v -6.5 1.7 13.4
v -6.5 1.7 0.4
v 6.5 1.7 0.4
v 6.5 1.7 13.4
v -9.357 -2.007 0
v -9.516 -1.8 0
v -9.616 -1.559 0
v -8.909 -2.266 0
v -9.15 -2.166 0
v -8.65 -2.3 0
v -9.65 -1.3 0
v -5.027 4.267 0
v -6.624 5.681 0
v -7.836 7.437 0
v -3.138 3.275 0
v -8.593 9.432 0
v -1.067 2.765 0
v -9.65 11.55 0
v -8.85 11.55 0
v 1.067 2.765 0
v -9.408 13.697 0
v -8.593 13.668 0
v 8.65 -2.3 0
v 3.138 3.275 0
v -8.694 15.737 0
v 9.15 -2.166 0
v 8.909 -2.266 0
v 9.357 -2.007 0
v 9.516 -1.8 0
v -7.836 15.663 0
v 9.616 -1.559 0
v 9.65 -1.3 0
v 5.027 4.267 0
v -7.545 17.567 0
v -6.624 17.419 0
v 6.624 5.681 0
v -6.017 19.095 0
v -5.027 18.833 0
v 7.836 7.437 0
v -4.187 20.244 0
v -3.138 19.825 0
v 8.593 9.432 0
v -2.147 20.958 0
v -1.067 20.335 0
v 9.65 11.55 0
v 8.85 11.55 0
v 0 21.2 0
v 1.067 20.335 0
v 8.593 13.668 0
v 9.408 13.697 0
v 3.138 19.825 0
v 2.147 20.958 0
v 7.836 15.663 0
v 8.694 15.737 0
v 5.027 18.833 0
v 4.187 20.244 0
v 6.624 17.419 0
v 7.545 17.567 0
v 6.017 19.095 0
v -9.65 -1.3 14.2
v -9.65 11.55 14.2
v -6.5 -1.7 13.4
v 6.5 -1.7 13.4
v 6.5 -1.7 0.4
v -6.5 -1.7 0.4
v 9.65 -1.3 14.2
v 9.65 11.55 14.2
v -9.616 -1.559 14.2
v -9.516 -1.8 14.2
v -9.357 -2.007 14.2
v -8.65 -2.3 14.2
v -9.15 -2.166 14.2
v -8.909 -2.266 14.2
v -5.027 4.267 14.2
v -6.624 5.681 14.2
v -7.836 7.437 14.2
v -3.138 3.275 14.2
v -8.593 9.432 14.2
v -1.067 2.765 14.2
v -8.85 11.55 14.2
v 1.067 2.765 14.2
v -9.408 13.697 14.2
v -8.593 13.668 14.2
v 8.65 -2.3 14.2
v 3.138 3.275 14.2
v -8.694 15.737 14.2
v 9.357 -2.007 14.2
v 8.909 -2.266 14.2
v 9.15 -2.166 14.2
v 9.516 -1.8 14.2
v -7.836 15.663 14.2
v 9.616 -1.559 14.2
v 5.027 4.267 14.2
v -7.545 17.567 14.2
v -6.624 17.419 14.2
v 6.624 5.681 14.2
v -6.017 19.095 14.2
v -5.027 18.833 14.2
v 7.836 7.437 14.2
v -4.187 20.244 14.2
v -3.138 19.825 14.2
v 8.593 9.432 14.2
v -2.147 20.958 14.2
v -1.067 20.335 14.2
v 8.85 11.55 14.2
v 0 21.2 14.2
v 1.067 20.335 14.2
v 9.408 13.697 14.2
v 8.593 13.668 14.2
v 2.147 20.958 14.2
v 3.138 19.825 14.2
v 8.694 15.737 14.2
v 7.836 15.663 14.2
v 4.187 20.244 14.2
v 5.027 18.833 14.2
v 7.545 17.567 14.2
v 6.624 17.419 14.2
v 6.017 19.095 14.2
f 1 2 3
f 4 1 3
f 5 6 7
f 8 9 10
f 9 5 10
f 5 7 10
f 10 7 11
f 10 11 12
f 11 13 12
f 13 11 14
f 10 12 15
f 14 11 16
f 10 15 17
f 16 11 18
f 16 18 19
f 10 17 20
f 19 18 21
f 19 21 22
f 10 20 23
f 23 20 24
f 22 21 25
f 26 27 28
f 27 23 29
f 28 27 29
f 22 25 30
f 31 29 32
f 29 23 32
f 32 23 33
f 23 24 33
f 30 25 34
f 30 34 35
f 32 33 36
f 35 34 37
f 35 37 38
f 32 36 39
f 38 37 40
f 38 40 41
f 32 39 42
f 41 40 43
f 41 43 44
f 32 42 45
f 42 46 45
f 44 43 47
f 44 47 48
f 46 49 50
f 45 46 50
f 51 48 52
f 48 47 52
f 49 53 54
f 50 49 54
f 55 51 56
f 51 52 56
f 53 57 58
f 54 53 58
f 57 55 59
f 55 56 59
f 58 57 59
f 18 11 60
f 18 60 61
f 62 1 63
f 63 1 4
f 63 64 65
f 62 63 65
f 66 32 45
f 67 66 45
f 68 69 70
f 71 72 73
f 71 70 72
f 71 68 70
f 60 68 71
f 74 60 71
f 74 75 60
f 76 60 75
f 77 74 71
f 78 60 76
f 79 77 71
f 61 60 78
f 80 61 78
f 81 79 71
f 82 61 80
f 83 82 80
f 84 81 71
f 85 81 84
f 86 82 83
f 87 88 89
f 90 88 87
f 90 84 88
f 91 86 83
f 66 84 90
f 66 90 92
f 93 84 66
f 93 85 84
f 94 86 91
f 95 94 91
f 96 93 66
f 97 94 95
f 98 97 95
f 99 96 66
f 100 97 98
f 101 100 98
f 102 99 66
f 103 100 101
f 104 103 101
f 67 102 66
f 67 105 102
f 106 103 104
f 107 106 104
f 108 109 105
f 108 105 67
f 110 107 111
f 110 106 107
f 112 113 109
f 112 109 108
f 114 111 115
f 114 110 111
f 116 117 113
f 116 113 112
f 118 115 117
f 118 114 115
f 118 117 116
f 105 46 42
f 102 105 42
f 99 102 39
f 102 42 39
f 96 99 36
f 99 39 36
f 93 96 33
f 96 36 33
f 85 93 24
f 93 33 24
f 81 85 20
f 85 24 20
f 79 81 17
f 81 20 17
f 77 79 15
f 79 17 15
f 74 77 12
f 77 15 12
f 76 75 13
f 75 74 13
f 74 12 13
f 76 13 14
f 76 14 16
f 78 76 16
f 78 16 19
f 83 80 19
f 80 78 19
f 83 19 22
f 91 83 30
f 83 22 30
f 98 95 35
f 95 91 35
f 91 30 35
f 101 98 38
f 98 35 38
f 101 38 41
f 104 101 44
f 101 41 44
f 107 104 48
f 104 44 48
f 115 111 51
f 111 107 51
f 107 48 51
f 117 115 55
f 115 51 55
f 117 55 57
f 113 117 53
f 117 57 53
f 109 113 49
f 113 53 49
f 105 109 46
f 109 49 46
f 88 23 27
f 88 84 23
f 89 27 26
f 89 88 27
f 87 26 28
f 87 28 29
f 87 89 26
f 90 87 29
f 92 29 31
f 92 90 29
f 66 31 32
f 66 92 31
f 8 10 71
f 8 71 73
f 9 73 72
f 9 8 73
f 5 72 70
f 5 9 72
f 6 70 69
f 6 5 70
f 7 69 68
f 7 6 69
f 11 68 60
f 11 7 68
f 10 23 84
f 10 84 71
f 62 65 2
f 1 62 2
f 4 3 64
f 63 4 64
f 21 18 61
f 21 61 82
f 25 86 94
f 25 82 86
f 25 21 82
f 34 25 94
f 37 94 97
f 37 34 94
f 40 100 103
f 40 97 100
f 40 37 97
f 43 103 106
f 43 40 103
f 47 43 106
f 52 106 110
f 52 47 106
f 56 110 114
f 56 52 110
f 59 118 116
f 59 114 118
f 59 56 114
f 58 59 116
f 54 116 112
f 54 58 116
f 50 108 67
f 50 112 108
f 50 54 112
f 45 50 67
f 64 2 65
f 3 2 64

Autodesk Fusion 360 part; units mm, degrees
sketch "Sketch1" plane through (0, 0, 0) normal (0, 0, 1) x (1, 0, 0)
  line L0 (6.5, -1.7) -> (-6.5, -1.7)
  line L1 (-6.5, -1.7) -> (-6.5, 1.7)
  line L2 (-6.5, 1.7) -> (6.5, 1.7)
  line L3 (6.5, 1.7) -> (6.5, -1.7)
  line L4 (6.5, -1.7) -> (-6.5, 1.7) construction
  line L5 (-6.5, -1.7) -> (6.5, 1.7) construction
  line L6 (6.5, -2.3) -> (-6.5, -2.3)
  line L7 (6.5, -2.3) -> (9.65, -2.3)
  circle A0 centre (0, 11.55) radius 8.85
  line L8 (9.65, -2.3) -> (9.65, 11.55)
  line L9 (0, 2.5) -> (0, 20)
  line L10 (-6.5, -2.3) -> (-9.65, -2.3)
  line L11 (-9.65, -2.3) -> (-9.65, 11.55)
  arc A1 (9.65, 11.55) -> (-9.65, 11.55) centre (0, 11.55) ccw
  dimension "d1" = 13
  dimension "d2" = 3.4
  dimension "d3" = -0.6
  dimension "d4" = 17.7
  dimension "d5" = 1
  dimension "d6" = 0.8
extrude "Extrude1" add sketch "Sketch1" along normal blind 0.4 contours L0 L1 L2 L3 | L6 L7 L8 L10 L11 A1
extrude "Extrude2" add sketch "Sketch1" along normal blind 13 from surface at 0.4
extrude "Extrude3" add sketch "Sketch1" along normal blind 0.8 from surface at 13.4 contours L0 L1 L2 L3 | L6 L7 L8 L10 L11 A1
fillet "Fillet1" radius 1 2 edges at (9.65, -2.3, 7.1) (-9.65, -2.3, 7.1)
